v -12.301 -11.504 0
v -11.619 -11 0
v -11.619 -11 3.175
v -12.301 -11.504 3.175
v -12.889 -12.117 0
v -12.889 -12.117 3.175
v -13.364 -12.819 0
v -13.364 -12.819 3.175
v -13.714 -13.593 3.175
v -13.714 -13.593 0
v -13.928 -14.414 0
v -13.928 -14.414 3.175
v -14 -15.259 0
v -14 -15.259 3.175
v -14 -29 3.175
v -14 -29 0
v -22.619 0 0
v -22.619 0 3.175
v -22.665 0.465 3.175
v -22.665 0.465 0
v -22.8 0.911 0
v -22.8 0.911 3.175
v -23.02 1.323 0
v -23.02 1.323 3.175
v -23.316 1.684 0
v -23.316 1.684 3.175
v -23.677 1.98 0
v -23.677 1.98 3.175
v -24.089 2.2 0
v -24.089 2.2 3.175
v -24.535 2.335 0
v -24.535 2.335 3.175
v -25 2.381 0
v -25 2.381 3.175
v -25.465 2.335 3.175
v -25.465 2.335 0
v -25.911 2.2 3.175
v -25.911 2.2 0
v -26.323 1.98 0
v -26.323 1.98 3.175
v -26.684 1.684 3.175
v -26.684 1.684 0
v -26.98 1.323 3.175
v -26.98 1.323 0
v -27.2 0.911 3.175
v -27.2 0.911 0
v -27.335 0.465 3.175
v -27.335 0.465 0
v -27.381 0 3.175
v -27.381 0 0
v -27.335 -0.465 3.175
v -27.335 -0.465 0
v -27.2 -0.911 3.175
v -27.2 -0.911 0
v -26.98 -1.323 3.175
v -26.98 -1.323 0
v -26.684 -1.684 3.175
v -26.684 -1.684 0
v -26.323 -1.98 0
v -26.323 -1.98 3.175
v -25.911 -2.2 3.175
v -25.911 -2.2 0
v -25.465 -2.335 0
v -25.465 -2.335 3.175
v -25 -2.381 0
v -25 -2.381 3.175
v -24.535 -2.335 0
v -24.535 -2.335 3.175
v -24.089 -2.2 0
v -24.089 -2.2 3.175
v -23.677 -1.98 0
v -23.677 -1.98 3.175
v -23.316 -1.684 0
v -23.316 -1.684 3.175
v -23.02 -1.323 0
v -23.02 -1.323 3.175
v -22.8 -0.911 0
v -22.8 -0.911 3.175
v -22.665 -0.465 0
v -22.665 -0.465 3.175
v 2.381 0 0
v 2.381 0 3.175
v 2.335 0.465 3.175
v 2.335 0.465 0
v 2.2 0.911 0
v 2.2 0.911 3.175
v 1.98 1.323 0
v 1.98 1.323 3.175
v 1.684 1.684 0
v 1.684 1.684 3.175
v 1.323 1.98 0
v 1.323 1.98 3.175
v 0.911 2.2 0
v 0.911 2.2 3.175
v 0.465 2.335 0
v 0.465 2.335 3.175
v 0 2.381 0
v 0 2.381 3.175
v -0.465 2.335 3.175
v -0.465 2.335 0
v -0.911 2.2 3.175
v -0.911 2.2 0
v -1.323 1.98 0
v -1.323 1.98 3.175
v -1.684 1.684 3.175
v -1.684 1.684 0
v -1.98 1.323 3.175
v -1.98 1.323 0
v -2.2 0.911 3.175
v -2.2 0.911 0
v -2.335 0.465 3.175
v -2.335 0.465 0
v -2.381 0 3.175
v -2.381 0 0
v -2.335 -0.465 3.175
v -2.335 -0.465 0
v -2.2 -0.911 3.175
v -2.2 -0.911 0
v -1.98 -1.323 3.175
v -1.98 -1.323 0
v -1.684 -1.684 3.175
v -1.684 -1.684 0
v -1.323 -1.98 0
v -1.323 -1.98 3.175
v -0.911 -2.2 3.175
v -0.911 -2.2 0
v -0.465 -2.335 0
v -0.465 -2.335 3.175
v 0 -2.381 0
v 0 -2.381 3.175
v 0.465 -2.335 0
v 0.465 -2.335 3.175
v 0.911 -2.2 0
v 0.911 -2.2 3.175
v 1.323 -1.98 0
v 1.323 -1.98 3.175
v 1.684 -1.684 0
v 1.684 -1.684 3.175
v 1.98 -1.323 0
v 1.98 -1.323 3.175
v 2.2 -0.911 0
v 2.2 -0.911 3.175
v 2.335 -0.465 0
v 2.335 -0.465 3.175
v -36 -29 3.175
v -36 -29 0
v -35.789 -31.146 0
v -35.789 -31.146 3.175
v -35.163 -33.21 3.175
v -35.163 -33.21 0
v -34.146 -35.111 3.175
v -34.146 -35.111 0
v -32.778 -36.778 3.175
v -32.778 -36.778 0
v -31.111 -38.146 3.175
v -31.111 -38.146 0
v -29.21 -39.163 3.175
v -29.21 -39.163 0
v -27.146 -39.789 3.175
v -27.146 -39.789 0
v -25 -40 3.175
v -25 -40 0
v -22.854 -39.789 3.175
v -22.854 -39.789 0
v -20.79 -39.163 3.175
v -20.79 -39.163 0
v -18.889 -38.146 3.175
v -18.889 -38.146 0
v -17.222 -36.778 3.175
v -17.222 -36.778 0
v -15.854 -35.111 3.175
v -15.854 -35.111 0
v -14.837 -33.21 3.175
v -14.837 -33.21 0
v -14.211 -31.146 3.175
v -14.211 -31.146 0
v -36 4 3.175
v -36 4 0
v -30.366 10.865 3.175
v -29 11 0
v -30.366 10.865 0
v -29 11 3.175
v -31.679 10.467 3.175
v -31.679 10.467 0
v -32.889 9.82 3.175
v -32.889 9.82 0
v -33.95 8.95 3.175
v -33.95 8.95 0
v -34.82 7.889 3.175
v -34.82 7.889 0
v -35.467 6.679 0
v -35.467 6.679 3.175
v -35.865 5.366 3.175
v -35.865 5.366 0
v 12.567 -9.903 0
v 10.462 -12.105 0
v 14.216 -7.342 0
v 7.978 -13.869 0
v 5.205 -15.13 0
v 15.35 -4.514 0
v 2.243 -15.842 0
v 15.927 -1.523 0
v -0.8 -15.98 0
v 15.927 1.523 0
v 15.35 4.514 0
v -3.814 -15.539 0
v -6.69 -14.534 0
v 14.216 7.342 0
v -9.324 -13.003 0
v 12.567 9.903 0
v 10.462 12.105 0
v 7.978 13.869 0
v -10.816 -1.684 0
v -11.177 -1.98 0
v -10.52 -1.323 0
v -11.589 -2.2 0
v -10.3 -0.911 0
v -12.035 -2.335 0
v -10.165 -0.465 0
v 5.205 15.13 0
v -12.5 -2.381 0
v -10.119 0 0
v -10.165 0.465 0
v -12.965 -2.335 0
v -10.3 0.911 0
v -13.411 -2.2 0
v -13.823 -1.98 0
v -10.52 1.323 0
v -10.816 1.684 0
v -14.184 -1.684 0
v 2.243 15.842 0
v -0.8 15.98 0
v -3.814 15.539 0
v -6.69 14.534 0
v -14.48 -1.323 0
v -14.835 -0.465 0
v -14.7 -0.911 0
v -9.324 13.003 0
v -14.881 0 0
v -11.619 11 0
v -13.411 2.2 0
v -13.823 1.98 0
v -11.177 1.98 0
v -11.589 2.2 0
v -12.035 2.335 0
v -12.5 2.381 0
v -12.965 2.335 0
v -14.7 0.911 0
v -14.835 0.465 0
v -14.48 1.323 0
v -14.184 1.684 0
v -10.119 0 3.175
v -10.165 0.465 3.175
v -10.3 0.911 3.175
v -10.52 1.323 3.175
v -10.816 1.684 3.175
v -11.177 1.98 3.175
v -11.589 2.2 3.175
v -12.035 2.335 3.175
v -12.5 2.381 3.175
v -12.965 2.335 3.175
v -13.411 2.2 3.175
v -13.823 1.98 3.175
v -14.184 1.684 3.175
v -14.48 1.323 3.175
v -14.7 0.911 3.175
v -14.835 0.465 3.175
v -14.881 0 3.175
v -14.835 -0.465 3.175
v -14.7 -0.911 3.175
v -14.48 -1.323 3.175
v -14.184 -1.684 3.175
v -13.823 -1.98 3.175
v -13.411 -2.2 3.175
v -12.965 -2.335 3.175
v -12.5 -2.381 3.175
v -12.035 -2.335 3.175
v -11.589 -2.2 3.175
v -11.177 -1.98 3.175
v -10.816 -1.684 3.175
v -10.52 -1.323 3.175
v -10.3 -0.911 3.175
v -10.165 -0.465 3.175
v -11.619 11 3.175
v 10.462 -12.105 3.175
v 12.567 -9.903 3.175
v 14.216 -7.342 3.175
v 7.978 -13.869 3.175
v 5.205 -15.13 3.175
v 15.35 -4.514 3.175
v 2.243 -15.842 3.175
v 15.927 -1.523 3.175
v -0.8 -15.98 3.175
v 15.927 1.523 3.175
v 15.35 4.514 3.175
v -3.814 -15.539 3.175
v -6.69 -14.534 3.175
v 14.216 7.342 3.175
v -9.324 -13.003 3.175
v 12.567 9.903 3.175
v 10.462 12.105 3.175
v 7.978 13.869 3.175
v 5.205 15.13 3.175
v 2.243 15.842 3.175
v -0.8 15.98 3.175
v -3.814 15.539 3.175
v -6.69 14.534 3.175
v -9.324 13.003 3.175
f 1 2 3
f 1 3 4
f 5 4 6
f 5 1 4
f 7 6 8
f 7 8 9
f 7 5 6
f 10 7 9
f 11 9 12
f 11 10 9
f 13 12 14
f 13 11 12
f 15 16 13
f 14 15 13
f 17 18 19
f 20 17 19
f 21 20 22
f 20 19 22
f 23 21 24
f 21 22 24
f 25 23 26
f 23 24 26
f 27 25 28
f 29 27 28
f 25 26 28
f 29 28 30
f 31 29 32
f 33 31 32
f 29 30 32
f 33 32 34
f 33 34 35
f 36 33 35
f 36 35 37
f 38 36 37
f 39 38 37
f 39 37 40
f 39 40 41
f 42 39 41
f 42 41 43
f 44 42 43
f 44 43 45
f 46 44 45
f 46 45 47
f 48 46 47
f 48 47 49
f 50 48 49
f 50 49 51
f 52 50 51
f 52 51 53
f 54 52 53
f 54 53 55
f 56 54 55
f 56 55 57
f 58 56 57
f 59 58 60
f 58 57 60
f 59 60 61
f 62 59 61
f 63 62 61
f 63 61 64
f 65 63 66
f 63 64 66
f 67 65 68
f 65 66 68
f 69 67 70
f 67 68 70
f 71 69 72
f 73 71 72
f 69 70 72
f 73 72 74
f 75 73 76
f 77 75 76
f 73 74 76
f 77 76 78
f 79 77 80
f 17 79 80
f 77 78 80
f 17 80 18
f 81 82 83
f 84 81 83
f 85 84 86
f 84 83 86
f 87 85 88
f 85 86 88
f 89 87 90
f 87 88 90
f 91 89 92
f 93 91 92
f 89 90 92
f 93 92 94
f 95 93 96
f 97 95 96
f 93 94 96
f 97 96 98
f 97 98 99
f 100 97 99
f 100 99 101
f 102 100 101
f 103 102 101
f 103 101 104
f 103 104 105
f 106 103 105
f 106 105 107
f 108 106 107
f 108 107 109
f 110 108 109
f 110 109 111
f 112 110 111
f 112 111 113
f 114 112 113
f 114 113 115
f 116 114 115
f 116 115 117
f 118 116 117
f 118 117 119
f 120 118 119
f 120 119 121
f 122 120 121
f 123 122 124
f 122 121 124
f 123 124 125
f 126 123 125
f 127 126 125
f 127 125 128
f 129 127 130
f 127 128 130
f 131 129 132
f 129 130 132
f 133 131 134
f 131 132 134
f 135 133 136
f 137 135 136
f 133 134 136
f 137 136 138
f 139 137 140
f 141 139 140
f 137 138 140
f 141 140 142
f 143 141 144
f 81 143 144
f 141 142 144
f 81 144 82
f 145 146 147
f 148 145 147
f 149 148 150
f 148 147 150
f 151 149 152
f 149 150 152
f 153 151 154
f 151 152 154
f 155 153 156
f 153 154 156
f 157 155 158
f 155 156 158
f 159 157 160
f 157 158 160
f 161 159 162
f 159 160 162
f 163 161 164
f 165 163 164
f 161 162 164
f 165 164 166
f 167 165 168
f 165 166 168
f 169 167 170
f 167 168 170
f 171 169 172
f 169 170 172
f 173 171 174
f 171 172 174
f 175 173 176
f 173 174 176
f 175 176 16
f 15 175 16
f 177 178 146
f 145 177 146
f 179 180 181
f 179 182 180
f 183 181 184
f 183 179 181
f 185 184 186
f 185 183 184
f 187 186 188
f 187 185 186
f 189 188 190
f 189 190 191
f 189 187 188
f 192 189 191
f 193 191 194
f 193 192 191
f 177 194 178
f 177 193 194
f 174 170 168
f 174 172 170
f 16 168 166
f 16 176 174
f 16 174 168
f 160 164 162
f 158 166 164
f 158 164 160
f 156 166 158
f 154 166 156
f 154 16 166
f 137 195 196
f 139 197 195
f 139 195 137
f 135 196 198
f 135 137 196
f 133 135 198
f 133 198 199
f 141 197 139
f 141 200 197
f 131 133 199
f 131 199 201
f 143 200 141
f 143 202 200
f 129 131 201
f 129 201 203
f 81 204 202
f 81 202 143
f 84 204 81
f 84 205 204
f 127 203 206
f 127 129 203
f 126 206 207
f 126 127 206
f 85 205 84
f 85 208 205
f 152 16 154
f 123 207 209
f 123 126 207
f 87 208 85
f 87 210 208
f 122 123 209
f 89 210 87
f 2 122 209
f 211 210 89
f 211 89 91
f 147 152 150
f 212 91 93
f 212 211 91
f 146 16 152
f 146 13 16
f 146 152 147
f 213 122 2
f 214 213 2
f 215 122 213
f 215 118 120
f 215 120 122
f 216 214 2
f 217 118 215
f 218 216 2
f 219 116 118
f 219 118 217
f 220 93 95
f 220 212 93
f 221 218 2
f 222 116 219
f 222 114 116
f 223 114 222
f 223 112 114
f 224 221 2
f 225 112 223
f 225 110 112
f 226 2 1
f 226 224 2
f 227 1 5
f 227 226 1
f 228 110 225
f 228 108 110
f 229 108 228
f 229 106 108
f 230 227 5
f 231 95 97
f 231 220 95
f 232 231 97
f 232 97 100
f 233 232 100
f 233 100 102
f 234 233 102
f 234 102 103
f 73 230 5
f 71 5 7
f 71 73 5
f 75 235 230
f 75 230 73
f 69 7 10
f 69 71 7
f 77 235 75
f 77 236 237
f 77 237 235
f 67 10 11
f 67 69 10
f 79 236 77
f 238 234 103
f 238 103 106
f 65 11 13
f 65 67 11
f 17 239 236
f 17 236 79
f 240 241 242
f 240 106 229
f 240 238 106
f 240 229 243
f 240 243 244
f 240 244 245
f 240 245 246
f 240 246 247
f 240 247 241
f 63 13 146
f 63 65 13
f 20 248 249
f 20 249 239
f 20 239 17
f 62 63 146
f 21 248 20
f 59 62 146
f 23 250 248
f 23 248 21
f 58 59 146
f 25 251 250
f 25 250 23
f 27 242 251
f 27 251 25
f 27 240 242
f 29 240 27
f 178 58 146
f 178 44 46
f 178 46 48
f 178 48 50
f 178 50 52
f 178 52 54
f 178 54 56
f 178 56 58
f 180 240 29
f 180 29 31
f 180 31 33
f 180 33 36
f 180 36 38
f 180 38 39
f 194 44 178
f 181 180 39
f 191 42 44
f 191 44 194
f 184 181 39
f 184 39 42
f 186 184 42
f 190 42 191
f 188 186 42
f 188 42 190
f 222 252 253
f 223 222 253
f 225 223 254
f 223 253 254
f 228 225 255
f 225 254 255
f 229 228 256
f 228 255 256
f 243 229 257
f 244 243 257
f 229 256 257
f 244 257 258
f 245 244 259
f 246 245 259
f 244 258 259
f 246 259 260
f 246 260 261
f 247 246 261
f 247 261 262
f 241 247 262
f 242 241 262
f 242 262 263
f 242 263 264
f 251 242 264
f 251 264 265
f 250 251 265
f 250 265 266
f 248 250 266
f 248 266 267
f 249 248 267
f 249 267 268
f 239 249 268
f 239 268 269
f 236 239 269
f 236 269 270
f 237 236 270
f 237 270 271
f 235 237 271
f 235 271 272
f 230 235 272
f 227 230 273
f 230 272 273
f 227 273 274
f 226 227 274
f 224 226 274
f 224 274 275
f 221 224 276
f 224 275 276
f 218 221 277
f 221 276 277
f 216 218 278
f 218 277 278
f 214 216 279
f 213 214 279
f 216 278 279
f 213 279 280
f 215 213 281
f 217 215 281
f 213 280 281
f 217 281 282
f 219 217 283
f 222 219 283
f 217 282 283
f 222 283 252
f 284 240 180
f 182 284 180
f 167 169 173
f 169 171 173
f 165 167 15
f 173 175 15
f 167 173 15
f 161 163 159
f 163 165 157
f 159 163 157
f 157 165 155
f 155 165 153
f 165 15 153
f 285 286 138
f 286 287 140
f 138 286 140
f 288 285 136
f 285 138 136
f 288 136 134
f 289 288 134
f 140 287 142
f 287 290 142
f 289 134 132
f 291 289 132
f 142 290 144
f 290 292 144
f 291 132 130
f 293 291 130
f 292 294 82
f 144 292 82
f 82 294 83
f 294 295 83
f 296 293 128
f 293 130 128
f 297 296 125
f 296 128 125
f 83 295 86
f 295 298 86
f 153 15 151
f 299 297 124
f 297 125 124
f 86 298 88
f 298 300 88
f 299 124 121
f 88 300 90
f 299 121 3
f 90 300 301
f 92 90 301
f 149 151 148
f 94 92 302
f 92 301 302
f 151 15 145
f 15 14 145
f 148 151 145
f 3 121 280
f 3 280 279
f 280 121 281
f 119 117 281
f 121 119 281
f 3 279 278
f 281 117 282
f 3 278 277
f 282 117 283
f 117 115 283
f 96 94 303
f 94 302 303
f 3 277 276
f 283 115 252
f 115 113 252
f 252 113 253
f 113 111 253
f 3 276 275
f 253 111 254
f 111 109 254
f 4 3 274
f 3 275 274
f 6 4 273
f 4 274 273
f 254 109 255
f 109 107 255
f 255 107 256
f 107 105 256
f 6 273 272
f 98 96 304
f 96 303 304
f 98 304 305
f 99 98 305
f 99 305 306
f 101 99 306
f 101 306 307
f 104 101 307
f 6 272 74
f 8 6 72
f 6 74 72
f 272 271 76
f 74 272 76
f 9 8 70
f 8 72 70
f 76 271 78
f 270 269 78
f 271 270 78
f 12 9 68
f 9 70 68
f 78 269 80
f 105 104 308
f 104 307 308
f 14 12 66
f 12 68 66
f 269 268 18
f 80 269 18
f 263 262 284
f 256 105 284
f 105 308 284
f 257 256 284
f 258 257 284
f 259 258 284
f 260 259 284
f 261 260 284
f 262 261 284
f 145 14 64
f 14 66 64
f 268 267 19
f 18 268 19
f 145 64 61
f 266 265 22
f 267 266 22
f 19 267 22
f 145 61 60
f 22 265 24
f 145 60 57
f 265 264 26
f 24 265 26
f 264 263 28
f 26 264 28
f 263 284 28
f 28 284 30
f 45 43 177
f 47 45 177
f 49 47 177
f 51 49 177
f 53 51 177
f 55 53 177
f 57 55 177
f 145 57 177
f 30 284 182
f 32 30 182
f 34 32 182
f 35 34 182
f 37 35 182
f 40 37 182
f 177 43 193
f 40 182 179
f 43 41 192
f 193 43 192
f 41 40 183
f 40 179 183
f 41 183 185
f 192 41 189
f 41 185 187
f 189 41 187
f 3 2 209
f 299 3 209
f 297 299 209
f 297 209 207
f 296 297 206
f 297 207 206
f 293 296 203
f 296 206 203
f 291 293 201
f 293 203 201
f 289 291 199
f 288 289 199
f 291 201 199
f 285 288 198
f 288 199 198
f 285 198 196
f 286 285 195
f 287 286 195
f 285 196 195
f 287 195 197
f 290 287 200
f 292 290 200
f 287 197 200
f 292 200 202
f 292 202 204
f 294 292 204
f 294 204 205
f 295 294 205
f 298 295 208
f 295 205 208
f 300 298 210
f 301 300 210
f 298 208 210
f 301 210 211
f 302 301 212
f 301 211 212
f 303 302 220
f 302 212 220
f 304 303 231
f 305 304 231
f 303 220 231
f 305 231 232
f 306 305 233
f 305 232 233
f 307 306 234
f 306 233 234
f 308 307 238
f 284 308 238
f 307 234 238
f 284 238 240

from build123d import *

# Parameters (mm, degrees)
BOSS_EXTRUDE1_DEPTH = 3.175
FILLET1_R           = 7
FILLET2_R           = 5
SKETCH2_R           = 2.38125
CUT_EXTRUDE1_DEPTH  = 54.908075694
LPATTERN1_COUNT     = 3
LPATTERN1_PITCH     = 12.5


with BuildPart() as part:
    # Sketch1 → Boss-Extrude1 (new body)
    with BuildSketch(Plane.XY):
        with BuildLine():
            Line((-11.618950039, 11), (-36, 11))
            Line((-36, 11), (-36, -29))
            ThreePointArc((-36, -29), (-25, -40), (-14, -29))
            Line((-14, -29), (-14, -11))
            Line((-14, -11), (-11.618950039, -11))
            ThreePointArc((-11.618950039, -11), (16, 0), (-11.618950039, 11))
        make_face()
    extrude(amount=BOSS_EXTRUDE1_DEPTH)

    # Fillet1
    fillet1_edges = [part.edges().sort_by_distance(p)[0] for p in [
        (-36, 11, 1.5875),
    ]]
    fillet(fillet1_edges, radius=FILLET1_R)

    # Fillet2
    # the kernel refuses this fillet: 5 mm, written as the material it adds along each edge
    with BuildSketch(Plane(origin=(-14, -11, 0), x_dir=(1, 0, 0), z_dir=(0, 0, 1))) as fillet2_piece_1:
        with BuildLine():
            CenterArc((5, -4.259237102), FILLET2_R, 121.586822832, 58.413177168)
            Line((0, -4.259237102), (-0.1, -4.259237102))
            Line((-0.1, -4.259237102), (-0.1, 0))
            Line((-0.1, 0), (0, 0.1))
            ThreePointArc((0, 0.1), (1.190524981, 0.1), (2.328670961, 0.085184742))
            Line((2.328670961, 0.085184742), (2.381049961, 0))
        make_face()
    extrude(amount=3.175)

    # Sketch2 → Cut-Extrude1 (cut, through all)
    with BuildSketch(Plane.XY.offset(3.175)):
        Circle(SKETCH2_R)
    cut_extrude1 = extrude(amount=-CUT_EXTRUDE1_DEPTH, mode=Mode.SUBTRACT)

    # LPattern1: Cut-Extrude1 ×3
    with Locations(*[(-i * LPATTERN1_PITCH, 0, 0) for i in range(1, LPATTERN1_COUNT)]):
        add(cut_extrude1, mode=Mode.SUBTRACT)


solid = part.part
